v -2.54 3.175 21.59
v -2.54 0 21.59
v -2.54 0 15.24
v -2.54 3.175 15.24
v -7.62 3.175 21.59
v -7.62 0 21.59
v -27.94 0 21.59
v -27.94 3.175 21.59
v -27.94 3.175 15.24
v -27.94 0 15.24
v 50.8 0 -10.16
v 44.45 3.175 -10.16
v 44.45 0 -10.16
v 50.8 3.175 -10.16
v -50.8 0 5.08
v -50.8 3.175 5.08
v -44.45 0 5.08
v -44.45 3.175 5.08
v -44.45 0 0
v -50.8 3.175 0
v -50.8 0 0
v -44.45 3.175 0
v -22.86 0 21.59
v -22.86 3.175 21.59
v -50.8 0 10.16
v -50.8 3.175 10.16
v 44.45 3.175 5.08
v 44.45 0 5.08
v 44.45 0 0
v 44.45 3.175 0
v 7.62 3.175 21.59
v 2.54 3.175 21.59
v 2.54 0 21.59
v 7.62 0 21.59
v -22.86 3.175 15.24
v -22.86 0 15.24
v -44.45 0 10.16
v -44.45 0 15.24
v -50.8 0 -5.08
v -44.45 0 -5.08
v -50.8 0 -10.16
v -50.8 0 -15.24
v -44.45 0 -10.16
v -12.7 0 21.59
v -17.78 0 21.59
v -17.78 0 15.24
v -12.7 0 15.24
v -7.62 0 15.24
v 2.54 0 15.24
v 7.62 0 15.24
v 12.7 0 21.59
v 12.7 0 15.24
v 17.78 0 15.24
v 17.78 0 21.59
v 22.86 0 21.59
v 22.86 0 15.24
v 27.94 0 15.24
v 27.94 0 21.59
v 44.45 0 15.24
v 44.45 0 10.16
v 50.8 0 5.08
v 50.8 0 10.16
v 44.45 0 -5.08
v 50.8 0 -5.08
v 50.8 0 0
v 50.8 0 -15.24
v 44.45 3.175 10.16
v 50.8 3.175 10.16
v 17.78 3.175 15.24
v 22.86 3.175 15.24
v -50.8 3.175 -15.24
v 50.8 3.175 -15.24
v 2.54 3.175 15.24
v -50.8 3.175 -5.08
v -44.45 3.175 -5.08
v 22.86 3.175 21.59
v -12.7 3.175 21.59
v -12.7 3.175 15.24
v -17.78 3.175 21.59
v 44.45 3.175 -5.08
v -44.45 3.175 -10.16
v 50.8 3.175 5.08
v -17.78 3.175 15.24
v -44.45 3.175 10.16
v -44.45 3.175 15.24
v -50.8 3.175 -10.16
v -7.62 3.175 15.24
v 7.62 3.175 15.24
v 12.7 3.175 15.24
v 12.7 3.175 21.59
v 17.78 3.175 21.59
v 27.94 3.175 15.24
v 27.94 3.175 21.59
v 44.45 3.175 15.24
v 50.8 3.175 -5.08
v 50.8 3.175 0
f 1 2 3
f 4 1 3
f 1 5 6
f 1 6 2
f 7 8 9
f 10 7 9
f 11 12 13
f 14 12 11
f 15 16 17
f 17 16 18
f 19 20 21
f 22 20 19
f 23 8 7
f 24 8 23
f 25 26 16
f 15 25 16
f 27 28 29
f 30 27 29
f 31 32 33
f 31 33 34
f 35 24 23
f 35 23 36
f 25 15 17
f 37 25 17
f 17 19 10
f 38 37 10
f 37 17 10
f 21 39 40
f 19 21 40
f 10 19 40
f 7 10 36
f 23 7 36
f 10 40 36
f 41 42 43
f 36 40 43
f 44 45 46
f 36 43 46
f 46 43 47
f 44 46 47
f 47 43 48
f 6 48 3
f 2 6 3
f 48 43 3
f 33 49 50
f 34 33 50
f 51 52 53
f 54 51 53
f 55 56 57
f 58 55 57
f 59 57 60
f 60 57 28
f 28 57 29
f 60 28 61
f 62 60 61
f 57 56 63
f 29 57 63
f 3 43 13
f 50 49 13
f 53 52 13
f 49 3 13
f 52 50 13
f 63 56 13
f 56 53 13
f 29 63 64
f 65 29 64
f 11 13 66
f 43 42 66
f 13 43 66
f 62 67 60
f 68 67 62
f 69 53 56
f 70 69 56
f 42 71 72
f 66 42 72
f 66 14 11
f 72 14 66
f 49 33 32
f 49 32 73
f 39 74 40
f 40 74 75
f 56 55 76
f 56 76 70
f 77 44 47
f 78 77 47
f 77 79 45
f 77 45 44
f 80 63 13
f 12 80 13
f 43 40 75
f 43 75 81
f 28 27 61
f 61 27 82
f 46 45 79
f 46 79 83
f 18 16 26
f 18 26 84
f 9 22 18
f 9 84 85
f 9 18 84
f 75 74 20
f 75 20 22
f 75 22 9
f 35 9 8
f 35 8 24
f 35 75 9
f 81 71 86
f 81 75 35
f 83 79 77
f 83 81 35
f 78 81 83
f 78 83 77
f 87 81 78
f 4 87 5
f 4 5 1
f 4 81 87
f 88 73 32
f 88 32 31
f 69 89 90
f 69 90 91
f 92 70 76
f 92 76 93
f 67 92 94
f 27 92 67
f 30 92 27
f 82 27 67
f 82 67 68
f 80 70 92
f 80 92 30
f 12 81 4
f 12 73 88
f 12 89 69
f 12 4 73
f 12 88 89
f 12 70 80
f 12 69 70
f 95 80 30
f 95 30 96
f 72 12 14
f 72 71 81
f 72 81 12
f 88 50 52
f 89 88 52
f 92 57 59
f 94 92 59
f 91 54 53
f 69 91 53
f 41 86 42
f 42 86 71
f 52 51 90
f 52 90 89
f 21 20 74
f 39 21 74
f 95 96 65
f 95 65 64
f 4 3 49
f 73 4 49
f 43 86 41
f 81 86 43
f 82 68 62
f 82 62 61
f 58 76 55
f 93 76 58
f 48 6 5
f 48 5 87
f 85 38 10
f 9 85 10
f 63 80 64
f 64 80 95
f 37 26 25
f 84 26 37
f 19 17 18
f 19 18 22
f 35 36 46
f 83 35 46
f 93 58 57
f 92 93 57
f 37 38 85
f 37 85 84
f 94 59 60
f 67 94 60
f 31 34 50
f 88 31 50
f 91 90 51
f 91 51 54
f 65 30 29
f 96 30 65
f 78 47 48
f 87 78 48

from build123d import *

# Parameters (mm, degrees)
SKETCH1_W           = 88.9
SKETCH1_H           = 30.48
BOSS_EXTRUDE1_DEPTH = 3.175
SKETCH3_W           = 5.08
SKETCH3_H           = 3.175
BOSS_EXTRUDE2_DEPTH = 3.175
SKETCH4_W           = 5.08
SKETCH4_H           = 3.175
BOSS_EXTRUDE3_DEPTH = 3.175
SKETCH5_W           = 6.35
SKETCH5_H           = 5.08
BOSS_EXTRUDE4_DEPTH = 3.175


with BuildPart() as part:
    # Sketch1 → Boss-Extrude1 (new body)
    with BuildSketch(Plane(origin=(0, 0, 0), x_dir=(1, 0, 0), z_dir=(0, 1, 0))):
        Rectangle(SKETCH1_W, SKETCH1_H)
    extrude(amount=BOSS_EXTRUDE1_DEPTH)

    # Sketch3 → Boss-Extrude2 (add)
    with BuildSketch(Plane(origin=(0, 0, 0), x_dir=(1, 0, 0), z_dir=(0, 1, 0))):
        with Locations((-25.4, -16.8275)):
            Rectangle(SKETCH3_W, SKETCH3_H)
        with Locations((-15.24, -16.8275)):
            Rectangle(SKETCH3_W, SKETCH3_H)
        with Locations((-5.08, -16.8275)):
            Rectangle(SKETCH3_W, SKETCH3_H)
        with Locations((5.08, -16.8275)):
            Rectangle(SKETCH3_W, SKETCH3_H)
        with Locations((15.24, -16.8275)):
            Rectangle(SKETCH3_W, SKETCH3_H)
        with Locations((25.4, -16.8275)):
            Rectangle(SKETCH3_W, SKETCH3_H)
    extrude(amount=BOSS_EXTRUDE2_DEPTH)

    # Sketch4 → Boss-Extrude3 (add)
    with BuildSketch(Plane(origin=(0, 3.175, 0), x_dir=(1, 0, 0), z_dir=(0, 1, 0))):
        with Locations((-25.4, -20.0025)):
            Rectangle(SKETCH4_W, SKETCH4_H)
        with Locations((-15.24, -20.0025)):
            Rectangle(SKETCH4_W, SKETCH4_H)
        with Locations((-5.08, -20.0025)):
            Rectangle(SKETCH4_W, SKETCH4_H)
        with Locations((5.08, -20.0025)):
            Rectangle(SKETCH4_W, SKETCH4_H)
        with Locations((15.24, -20.0025)):
            Rectangle(SKETCH4_W, SKETCH4_H)
        with Locations((25.4, -20.0025)):
            Rectangle(SKETCH4_W, SKETCH4_H)
    extrude(amount=-BOSS_EXTRUDE3_DEPTH)

    # Sketch5 → Boss-Extrude4 (add)
    with BuildSketch(Plane(origin=(0, 3.175, 0), x_dir=(1, 0, 0), z_dir=(0, 1, 0))):
        with Locations((-47.625, 2.54)):
            Rectangle(SKETCH5_W, SKETCH5_H)
        with Locations((-47.625, 12.7)):
            Rectangle(SKETCH5_W, SKETCH5_H)
        with Locations((-47.625, -7.62)):
            Rectangle(SKETCH5_W, SKETCH5_H)
        with Locations((47.625, -7.62)):
            Rectangle(SKETCH5_W, SKETCH5_H)
        with Locations((47.625, 2.54)):
            Rectangle(SKETCH5_W, SKETCH5_H)
        with Locations((47.625, 12.7)):
            Rectangle(SKETCH5_W, SKETCH5_H)
    extrude(amount=-BOSS_EXTRUDE4_DEPTH)


solid = part.part
